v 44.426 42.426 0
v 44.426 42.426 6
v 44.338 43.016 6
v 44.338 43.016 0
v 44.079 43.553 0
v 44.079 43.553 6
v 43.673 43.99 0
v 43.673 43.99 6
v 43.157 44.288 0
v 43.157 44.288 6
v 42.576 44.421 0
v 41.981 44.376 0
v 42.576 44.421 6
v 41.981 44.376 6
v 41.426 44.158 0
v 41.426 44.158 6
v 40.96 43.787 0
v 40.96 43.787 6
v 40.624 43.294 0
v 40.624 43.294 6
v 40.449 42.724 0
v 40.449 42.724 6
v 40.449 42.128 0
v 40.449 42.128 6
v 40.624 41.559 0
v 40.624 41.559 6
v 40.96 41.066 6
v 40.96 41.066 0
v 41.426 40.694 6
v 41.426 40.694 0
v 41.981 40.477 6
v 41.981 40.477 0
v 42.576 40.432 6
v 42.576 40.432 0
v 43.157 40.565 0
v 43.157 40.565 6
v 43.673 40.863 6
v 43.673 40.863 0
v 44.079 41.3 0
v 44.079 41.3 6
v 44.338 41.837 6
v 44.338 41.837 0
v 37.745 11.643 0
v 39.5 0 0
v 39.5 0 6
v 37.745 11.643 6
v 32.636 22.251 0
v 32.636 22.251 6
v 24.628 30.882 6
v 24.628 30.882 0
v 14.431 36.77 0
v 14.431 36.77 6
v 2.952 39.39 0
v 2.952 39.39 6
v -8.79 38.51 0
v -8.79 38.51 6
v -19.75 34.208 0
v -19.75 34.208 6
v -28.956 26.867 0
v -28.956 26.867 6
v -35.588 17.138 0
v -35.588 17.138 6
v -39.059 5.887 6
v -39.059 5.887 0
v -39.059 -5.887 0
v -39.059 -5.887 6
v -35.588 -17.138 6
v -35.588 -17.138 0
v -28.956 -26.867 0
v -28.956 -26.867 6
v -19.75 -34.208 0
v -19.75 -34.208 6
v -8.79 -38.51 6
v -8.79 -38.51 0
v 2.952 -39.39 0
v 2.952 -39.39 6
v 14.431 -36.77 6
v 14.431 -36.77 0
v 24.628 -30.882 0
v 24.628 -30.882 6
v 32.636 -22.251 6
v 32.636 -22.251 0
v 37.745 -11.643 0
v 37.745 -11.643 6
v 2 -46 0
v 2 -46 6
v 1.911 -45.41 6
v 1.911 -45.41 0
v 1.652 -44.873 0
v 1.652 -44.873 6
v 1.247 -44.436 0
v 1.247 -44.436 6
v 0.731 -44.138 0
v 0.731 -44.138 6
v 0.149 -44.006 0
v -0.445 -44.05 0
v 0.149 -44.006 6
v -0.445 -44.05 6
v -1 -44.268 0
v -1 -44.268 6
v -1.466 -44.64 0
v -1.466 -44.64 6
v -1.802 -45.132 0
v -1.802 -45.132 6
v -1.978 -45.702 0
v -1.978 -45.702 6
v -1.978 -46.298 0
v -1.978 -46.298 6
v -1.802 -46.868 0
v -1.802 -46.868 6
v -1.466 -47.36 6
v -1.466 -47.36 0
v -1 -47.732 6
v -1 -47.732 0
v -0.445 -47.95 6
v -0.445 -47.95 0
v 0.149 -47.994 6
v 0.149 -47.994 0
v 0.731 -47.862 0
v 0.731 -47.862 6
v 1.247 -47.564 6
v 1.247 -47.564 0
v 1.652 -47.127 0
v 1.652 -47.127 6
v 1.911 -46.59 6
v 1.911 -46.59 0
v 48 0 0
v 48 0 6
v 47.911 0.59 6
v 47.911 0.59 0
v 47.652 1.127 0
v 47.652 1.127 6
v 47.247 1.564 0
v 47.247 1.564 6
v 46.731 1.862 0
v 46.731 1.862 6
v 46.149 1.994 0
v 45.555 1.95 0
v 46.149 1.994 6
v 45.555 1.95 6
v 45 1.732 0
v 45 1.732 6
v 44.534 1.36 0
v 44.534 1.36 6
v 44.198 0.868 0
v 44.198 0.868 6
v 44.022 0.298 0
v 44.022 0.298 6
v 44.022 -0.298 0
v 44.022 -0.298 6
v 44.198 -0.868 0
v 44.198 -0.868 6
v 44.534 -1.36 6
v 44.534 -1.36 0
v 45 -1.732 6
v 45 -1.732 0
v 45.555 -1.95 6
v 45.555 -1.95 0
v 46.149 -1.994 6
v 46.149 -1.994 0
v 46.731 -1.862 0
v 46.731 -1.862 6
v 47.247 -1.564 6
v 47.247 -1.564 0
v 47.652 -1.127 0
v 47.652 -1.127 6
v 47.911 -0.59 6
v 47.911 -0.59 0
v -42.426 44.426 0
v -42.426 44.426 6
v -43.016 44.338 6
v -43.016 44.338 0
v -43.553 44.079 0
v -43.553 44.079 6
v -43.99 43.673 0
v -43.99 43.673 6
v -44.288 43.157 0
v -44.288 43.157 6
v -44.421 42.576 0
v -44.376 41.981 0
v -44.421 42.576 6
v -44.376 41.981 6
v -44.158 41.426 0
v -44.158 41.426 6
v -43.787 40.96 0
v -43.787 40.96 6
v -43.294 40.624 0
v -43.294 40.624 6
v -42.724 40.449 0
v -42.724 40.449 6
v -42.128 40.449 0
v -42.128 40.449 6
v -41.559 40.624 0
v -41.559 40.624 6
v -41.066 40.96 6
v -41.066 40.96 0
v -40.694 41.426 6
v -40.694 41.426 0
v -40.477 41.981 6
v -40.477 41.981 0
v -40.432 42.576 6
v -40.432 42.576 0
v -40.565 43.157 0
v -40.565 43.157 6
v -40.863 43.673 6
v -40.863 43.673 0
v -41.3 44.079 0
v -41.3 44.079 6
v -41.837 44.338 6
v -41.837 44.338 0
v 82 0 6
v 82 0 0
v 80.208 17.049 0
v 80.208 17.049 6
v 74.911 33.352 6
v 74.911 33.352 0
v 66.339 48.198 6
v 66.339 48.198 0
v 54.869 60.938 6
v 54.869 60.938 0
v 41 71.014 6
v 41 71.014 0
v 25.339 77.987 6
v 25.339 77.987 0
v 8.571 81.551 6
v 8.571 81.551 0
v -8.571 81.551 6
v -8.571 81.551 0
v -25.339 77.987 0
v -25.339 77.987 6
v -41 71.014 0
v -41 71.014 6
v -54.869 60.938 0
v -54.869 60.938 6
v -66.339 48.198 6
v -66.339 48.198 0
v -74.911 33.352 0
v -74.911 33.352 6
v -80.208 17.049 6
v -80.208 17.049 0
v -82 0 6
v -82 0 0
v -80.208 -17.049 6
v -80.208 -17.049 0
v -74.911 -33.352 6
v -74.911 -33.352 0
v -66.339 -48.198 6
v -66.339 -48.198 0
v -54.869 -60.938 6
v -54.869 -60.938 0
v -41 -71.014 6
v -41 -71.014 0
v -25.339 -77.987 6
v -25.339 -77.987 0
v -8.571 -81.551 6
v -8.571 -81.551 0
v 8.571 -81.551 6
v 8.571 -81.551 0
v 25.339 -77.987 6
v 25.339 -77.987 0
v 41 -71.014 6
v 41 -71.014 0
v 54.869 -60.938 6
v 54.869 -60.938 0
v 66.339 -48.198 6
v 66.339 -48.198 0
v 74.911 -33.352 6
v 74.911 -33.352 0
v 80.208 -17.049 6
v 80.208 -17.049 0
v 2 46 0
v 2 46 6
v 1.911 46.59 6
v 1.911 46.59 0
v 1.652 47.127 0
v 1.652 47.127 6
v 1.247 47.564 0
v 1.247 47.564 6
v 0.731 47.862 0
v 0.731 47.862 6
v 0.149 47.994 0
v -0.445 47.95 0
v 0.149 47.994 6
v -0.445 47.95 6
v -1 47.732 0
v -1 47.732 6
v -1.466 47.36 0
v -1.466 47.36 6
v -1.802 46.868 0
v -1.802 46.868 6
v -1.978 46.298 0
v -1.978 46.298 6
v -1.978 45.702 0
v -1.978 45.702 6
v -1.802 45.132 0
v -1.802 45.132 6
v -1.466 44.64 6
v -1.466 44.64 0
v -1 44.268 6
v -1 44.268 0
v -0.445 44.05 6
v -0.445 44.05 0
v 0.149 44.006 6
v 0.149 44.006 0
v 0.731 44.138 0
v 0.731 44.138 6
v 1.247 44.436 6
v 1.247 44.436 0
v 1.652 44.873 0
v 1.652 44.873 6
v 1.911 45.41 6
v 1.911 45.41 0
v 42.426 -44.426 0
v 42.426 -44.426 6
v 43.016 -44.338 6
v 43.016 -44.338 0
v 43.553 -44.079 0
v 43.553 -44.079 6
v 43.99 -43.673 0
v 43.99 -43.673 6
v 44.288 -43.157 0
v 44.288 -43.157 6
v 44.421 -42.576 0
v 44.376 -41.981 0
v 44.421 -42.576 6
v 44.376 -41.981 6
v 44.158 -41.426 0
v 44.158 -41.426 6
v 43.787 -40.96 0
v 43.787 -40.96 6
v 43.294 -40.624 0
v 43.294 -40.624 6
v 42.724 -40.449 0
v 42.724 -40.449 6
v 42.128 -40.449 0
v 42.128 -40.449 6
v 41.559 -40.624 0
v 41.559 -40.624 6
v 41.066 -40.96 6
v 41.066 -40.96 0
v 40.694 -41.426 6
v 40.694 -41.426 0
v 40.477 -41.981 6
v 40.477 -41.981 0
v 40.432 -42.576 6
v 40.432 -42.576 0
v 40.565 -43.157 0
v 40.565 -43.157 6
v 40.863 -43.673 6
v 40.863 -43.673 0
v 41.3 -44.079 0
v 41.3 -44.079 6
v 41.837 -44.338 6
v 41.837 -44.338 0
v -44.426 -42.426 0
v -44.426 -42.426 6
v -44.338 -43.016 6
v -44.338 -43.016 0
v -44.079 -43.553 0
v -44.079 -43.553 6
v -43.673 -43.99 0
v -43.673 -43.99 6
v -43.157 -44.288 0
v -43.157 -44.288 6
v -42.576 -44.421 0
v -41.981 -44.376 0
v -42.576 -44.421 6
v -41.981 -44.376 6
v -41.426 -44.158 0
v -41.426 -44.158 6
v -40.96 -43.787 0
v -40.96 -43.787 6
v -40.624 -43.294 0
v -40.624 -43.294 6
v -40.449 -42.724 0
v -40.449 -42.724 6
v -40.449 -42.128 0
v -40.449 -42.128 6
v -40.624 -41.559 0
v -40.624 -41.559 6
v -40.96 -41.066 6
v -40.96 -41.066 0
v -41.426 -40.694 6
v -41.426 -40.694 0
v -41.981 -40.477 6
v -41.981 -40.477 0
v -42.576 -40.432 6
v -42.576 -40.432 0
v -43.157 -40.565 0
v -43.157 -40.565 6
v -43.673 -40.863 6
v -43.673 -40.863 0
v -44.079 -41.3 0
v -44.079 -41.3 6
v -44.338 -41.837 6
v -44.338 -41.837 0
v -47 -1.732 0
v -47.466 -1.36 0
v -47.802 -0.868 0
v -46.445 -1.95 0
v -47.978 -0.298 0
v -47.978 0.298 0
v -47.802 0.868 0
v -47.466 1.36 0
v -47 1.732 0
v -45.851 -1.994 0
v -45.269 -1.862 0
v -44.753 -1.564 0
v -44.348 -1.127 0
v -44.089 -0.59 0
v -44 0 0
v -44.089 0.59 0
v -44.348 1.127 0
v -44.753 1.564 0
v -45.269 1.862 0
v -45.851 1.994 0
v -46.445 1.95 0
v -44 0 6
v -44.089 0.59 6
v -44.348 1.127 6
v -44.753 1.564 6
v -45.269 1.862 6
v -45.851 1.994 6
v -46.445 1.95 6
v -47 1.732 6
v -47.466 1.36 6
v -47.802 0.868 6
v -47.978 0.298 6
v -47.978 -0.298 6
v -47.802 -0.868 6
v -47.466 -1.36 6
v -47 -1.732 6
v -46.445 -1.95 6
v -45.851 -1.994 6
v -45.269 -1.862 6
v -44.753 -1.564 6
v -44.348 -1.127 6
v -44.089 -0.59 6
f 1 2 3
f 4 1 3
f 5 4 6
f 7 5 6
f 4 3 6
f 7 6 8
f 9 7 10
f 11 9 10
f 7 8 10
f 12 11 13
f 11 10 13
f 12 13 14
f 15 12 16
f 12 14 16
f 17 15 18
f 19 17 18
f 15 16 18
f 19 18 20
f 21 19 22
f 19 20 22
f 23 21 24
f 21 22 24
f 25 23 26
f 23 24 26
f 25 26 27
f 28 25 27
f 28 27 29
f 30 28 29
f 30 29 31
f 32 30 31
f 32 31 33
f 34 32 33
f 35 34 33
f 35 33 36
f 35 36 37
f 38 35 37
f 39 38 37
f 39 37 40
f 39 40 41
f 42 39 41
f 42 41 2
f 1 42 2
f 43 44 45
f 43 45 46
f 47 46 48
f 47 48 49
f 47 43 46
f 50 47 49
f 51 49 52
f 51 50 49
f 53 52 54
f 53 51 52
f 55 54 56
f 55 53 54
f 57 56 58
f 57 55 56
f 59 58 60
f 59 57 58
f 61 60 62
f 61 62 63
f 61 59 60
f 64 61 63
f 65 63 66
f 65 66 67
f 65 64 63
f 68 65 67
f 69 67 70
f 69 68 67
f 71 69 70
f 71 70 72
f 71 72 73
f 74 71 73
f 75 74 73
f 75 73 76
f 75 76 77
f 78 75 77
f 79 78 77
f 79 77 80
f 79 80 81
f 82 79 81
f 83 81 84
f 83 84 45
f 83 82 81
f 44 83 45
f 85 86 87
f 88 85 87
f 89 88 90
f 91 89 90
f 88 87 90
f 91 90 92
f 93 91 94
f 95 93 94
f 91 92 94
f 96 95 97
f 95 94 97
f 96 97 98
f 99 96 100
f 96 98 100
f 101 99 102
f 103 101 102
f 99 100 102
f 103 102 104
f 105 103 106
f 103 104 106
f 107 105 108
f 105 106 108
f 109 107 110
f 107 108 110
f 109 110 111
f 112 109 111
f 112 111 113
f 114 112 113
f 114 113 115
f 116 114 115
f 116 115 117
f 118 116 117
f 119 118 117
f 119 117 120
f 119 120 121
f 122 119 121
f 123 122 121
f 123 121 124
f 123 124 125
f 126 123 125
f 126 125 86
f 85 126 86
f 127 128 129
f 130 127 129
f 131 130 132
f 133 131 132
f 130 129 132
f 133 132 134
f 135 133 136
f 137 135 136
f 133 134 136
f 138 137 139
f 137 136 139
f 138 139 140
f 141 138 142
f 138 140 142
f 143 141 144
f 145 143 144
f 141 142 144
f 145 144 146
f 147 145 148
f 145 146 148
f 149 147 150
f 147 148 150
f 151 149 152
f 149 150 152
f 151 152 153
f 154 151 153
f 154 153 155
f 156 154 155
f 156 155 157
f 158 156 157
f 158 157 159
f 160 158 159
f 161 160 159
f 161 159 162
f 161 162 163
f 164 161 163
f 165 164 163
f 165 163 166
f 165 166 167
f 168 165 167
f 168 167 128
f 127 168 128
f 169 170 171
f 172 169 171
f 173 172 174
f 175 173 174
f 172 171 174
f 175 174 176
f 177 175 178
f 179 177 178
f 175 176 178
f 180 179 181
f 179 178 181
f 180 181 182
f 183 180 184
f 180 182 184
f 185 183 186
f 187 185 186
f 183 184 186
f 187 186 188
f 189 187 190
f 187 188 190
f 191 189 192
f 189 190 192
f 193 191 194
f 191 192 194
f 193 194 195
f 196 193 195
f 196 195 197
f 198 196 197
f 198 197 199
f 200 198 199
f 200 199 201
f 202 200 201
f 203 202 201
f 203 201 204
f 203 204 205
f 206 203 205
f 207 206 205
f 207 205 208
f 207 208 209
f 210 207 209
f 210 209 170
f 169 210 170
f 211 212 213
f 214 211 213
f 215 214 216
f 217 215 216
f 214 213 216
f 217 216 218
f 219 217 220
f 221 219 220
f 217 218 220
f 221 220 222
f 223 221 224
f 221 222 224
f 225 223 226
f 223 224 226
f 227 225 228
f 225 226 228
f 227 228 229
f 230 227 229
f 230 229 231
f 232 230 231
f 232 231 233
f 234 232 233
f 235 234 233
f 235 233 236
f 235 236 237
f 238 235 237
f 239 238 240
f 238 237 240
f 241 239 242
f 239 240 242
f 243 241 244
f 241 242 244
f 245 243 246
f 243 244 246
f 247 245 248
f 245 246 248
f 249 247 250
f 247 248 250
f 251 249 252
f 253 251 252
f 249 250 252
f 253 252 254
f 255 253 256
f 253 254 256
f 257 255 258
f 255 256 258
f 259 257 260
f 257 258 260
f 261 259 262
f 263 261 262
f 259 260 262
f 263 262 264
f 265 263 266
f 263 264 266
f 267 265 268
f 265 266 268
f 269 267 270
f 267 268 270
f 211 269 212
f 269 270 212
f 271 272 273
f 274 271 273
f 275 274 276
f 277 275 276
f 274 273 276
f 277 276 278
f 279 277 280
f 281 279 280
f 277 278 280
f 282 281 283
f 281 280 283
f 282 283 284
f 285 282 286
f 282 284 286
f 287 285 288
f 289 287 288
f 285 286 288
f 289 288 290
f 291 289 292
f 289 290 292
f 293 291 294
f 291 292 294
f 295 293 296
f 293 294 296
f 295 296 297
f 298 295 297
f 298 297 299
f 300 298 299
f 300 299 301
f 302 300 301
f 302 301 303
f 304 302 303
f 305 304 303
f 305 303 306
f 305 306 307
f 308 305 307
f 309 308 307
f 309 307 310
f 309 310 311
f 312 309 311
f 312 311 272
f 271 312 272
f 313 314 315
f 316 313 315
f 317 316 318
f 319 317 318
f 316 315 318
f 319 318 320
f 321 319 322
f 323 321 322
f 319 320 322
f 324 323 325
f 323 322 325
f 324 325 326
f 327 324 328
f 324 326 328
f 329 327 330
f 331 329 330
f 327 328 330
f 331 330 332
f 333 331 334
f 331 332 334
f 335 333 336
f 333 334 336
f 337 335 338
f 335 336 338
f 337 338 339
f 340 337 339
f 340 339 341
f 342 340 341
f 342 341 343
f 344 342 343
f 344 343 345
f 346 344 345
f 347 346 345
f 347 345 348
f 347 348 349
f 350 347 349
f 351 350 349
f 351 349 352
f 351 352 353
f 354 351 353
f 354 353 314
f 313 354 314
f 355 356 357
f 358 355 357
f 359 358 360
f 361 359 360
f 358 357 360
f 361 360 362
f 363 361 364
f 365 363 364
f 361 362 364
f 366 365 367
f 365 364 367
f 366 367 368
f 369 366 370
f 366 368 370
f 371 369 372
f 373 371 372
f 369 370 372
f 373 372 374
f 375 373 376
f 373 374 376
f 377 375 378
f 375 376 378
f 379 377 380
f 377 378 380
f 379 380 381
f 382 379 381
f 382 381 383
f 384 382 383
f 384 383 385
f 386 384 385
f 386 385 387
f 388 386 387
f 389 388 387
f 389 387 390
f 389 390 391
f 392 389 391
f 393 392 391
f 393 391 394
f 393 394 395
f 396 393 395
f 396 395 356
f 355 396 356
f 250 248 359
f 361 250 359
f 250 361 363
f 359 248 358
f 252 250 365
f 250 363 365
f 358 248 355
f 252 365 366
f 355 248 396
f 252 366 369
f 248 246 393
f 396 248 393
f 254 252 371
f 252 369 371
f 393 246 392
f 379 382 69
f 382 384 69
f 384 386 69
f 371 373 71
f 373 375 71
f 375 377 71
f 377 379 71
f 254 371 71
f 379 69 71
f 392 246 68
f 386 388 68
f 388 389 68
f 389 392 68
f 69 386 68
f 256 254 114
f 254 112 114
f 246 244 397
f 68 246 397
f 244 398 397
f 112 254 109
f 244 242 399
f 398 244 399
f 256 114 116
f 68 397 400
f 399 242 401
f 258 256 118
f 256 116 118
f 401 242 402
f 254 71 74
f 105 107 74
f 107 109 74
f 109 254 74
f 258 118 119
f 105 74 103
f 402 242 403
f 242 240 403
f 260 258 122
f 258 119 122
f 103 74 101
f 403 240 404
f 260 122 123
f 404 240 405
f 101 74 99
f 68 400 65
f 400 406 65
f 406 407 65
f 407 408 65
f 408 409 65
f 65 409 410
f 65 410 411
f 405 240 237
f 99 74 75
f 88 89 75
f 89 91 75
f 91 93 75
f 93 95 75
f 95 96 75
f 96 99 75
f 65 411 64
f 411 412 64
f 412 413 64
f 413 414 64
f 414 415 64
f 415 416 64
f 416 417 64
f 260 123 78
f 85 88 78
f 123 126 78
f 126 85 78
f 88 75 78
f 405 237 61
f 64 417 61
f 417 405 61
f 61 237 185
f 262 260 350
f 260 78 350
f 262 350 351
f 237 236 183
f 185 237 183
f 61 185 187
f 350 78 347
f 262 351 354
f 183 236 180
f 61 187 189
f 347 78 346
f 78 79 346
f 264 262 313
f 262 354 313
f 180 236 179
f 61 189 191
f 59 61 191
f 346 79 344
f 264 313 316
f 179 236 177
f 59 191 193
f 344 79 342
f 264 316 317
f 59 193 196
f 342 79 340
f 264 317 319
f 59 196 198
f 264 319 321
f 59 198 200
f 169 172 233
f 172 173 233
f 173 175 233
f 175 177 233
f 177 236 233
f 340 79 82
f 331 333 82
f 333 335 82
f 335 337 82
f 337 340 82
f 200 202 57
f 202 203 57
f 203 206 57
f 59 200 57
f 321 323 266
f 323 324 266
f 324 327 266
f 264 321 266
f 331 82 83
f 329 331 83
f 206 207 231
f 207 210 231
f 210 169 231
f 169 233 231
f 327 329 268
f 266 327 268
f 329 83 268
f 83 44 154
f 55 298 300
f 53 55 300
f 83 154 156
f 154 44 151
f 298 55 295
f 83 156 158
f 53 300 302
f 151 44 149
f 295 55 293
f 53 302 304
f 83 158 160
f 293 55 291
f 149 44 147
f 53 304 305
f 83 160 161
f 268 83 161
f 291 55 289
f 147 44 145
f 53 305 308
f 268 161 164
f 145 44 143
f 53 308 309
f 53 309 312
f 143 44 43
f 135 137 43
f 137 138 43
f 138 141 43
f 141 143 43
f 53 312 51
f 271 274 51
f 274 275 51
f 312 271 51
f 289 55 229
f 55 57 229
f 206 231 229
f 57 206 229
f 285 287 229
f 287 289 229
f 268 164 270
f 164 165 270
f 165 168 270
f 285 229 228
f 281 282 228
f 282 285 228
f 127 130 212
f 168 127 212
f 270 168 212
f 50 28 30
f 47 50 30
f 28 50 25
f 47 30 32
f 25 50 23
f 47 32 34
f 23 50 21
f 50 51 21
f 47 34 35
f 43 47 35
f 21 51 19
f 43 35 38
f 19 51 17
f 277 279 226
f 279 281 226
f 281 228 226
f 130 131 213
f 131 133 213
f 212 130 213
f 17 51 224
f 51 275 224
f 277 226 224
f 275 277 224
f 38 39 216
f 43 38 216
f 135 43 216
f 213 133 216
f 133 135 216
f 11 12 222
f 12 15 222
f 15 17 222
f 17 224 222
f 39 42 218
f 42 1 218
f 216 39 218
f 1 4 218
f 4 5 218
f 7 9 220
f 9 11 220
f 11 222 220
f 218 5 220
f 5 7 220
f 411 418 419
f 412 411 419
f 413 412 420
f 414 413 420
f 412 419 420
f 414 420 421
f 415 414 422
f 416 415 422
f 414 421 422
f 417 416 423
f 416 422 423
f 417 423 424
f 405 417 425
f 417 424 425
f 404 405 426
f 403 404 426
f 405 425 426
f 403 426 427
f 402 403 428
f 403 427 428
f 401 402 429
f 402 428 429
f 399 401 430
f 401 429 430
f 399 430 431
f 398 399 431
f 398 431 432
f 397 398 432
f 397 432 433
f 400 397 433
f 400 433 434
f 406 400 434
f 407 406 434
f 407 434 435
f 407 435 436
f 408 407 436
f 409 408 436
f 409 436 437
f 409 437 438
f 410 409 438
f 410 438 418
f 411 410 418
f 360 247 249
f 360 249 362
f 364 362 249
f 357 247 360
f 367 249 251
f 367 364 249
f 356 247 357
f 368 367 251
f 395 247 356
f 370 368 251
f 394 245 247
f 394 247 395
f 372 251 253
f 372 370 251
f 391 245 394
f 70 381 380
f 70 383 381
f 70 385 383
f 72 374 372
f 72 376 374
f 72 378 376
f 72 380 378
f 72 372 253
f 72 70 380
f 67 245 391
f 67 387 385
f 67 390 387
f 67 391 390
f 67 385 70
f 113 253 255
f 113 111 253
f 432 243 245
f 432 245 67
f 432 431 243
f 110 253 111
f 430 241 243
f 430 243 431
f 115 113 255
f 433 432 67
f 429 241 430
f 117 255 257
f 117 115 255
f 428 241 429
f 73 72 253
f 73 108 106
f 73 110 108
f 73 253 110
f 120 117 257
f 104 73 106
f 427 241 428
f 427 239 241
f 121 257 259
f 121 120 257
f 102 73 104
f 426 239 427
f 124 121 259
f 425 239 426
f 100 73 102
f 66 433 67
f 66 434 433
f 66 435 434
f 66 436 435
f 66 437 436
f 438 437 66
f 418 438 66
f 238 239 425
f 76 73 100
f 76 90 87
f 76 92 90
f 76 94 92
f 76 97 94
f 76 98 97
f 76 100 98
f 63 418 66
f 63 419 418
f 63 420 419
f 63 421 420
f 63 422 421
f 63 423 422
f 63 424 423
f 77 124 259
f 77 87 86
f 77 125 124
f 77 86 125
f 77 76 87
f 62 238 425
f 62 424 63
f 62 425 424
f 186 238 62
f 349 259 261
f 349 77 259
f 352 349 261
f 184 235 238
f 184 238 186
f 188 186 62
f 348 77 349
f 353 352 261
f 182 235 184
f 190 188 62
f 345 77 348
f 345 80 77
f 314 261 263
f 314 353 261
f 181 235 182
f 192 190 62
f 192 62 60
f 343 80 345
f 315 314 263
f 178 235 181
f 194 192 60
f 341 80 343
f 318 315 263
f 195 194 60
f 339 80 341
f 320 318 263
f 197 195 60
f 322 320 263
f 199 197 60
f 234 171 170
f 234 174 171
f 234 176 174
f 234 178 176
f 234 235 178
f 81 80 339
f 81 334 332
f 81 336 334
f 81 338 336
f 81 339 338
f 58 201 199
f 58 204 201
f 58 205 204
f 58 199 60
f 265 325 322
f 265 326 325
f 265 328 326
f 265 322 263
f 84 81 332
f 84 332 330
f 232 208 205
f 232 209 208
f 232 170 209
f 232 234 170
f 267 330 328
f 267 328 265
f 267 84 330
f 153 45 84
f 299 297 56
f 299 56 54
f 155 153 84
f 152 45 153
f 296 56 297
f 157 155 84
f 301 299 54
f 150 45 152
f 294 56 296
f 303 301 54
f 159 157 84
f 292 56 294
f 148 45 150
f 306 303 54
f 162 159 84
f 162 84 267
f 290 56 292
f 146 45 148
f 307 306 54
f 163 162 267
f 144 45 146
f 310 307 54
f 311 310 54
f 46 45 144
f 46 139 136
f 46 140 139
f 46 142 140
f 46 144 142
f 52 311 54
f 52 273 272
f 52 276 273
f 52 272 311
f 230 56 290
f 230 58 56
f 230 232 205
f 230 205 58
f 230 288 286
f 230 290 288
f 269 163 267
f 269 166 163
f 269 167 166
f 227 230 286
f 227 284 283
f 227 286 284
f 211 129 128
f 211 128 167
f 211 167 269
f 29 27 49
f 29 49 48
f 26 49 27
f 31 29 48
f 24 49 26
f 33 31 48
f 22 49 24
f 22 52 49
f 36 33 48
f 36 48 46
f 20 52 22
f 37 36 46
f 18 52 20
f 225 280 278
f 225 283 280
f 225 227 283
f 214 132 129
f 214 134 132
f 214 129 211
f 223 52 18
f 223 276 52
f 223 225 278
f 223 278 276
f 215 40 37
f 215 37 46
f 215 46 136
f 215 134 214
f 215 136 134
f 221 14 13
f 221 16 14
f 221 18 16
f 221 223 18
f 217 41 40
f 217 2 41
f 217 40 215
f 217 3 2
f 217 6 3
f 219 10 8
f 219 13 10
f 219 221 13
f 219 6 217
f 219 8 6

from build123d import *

# Parameters (mm, degrees)
SKETCH1_R           = 82
SKETCH1_R_2         = 39.5
BOSS_EXTRUDE1_DEPTH = 6
SKETCH2_R           = 2
CUT_EXTRUDE1_DEPTH  = 10
CIRPATTERN1_COUNT   = 4
SKETCH3_R           = 2
CUT_EXTRUDE2_DEPTH  = 10


with BuildPart() as part:
    # Sketch1 → Boss-Extrude1 (new body)
    with BuildSketch(Plane.XY):
        Circle(SKETCH1_R)
        Circle(SKETCH1_R_2, mode=Mode.SUBTRACT)
    extrude(amount=BOSS_EXTRUDE1_DEPTH)

    # Sketch2 → Cut-Extrude1 (cut)
    with BuildSketch(Plane.XY.offset(6)):
        with Locations((42.426406871, 42.426406871)):
            Circle(SKETCH2_R)
    cut_extrude1 = extrude(amount=-CUT_EXTRUDE1_DEPTH, mode=Mode.SUBTRACT)

    # CirPattern1: Cut-Extrude1 ×4 about axis
    cirpattern1_axis = Axis((0, 0, 0), (0, 0, 1))
    for i in range(1, CIRPATTERN1_COUNT):
        add(cut_extrude1.rotate(cirpattern1_axis, i * 360 / CIRPATTERN1_COUNT), mode=Mode.SUBTRACT)

    # Sketch3 → Cut-Extrude2 (cut)
    with BuildSketch(Plane.XY.offset(6)):
        with Locations((0, 46)):
            Circle(SKETCH3_R)
        with Locations((46, 0)):
            Circle(SKETCH3_R)
        with Locations((0, -46)):
            Circle(SKETCH3_R)
        with Locations((-46, 0)):
            Circle(SKETCH3_R)
    extrude(amount=-CUT_EXTRUDE2_DEPTH, mode=Mode.SUBTRACT)


solid = part.part
